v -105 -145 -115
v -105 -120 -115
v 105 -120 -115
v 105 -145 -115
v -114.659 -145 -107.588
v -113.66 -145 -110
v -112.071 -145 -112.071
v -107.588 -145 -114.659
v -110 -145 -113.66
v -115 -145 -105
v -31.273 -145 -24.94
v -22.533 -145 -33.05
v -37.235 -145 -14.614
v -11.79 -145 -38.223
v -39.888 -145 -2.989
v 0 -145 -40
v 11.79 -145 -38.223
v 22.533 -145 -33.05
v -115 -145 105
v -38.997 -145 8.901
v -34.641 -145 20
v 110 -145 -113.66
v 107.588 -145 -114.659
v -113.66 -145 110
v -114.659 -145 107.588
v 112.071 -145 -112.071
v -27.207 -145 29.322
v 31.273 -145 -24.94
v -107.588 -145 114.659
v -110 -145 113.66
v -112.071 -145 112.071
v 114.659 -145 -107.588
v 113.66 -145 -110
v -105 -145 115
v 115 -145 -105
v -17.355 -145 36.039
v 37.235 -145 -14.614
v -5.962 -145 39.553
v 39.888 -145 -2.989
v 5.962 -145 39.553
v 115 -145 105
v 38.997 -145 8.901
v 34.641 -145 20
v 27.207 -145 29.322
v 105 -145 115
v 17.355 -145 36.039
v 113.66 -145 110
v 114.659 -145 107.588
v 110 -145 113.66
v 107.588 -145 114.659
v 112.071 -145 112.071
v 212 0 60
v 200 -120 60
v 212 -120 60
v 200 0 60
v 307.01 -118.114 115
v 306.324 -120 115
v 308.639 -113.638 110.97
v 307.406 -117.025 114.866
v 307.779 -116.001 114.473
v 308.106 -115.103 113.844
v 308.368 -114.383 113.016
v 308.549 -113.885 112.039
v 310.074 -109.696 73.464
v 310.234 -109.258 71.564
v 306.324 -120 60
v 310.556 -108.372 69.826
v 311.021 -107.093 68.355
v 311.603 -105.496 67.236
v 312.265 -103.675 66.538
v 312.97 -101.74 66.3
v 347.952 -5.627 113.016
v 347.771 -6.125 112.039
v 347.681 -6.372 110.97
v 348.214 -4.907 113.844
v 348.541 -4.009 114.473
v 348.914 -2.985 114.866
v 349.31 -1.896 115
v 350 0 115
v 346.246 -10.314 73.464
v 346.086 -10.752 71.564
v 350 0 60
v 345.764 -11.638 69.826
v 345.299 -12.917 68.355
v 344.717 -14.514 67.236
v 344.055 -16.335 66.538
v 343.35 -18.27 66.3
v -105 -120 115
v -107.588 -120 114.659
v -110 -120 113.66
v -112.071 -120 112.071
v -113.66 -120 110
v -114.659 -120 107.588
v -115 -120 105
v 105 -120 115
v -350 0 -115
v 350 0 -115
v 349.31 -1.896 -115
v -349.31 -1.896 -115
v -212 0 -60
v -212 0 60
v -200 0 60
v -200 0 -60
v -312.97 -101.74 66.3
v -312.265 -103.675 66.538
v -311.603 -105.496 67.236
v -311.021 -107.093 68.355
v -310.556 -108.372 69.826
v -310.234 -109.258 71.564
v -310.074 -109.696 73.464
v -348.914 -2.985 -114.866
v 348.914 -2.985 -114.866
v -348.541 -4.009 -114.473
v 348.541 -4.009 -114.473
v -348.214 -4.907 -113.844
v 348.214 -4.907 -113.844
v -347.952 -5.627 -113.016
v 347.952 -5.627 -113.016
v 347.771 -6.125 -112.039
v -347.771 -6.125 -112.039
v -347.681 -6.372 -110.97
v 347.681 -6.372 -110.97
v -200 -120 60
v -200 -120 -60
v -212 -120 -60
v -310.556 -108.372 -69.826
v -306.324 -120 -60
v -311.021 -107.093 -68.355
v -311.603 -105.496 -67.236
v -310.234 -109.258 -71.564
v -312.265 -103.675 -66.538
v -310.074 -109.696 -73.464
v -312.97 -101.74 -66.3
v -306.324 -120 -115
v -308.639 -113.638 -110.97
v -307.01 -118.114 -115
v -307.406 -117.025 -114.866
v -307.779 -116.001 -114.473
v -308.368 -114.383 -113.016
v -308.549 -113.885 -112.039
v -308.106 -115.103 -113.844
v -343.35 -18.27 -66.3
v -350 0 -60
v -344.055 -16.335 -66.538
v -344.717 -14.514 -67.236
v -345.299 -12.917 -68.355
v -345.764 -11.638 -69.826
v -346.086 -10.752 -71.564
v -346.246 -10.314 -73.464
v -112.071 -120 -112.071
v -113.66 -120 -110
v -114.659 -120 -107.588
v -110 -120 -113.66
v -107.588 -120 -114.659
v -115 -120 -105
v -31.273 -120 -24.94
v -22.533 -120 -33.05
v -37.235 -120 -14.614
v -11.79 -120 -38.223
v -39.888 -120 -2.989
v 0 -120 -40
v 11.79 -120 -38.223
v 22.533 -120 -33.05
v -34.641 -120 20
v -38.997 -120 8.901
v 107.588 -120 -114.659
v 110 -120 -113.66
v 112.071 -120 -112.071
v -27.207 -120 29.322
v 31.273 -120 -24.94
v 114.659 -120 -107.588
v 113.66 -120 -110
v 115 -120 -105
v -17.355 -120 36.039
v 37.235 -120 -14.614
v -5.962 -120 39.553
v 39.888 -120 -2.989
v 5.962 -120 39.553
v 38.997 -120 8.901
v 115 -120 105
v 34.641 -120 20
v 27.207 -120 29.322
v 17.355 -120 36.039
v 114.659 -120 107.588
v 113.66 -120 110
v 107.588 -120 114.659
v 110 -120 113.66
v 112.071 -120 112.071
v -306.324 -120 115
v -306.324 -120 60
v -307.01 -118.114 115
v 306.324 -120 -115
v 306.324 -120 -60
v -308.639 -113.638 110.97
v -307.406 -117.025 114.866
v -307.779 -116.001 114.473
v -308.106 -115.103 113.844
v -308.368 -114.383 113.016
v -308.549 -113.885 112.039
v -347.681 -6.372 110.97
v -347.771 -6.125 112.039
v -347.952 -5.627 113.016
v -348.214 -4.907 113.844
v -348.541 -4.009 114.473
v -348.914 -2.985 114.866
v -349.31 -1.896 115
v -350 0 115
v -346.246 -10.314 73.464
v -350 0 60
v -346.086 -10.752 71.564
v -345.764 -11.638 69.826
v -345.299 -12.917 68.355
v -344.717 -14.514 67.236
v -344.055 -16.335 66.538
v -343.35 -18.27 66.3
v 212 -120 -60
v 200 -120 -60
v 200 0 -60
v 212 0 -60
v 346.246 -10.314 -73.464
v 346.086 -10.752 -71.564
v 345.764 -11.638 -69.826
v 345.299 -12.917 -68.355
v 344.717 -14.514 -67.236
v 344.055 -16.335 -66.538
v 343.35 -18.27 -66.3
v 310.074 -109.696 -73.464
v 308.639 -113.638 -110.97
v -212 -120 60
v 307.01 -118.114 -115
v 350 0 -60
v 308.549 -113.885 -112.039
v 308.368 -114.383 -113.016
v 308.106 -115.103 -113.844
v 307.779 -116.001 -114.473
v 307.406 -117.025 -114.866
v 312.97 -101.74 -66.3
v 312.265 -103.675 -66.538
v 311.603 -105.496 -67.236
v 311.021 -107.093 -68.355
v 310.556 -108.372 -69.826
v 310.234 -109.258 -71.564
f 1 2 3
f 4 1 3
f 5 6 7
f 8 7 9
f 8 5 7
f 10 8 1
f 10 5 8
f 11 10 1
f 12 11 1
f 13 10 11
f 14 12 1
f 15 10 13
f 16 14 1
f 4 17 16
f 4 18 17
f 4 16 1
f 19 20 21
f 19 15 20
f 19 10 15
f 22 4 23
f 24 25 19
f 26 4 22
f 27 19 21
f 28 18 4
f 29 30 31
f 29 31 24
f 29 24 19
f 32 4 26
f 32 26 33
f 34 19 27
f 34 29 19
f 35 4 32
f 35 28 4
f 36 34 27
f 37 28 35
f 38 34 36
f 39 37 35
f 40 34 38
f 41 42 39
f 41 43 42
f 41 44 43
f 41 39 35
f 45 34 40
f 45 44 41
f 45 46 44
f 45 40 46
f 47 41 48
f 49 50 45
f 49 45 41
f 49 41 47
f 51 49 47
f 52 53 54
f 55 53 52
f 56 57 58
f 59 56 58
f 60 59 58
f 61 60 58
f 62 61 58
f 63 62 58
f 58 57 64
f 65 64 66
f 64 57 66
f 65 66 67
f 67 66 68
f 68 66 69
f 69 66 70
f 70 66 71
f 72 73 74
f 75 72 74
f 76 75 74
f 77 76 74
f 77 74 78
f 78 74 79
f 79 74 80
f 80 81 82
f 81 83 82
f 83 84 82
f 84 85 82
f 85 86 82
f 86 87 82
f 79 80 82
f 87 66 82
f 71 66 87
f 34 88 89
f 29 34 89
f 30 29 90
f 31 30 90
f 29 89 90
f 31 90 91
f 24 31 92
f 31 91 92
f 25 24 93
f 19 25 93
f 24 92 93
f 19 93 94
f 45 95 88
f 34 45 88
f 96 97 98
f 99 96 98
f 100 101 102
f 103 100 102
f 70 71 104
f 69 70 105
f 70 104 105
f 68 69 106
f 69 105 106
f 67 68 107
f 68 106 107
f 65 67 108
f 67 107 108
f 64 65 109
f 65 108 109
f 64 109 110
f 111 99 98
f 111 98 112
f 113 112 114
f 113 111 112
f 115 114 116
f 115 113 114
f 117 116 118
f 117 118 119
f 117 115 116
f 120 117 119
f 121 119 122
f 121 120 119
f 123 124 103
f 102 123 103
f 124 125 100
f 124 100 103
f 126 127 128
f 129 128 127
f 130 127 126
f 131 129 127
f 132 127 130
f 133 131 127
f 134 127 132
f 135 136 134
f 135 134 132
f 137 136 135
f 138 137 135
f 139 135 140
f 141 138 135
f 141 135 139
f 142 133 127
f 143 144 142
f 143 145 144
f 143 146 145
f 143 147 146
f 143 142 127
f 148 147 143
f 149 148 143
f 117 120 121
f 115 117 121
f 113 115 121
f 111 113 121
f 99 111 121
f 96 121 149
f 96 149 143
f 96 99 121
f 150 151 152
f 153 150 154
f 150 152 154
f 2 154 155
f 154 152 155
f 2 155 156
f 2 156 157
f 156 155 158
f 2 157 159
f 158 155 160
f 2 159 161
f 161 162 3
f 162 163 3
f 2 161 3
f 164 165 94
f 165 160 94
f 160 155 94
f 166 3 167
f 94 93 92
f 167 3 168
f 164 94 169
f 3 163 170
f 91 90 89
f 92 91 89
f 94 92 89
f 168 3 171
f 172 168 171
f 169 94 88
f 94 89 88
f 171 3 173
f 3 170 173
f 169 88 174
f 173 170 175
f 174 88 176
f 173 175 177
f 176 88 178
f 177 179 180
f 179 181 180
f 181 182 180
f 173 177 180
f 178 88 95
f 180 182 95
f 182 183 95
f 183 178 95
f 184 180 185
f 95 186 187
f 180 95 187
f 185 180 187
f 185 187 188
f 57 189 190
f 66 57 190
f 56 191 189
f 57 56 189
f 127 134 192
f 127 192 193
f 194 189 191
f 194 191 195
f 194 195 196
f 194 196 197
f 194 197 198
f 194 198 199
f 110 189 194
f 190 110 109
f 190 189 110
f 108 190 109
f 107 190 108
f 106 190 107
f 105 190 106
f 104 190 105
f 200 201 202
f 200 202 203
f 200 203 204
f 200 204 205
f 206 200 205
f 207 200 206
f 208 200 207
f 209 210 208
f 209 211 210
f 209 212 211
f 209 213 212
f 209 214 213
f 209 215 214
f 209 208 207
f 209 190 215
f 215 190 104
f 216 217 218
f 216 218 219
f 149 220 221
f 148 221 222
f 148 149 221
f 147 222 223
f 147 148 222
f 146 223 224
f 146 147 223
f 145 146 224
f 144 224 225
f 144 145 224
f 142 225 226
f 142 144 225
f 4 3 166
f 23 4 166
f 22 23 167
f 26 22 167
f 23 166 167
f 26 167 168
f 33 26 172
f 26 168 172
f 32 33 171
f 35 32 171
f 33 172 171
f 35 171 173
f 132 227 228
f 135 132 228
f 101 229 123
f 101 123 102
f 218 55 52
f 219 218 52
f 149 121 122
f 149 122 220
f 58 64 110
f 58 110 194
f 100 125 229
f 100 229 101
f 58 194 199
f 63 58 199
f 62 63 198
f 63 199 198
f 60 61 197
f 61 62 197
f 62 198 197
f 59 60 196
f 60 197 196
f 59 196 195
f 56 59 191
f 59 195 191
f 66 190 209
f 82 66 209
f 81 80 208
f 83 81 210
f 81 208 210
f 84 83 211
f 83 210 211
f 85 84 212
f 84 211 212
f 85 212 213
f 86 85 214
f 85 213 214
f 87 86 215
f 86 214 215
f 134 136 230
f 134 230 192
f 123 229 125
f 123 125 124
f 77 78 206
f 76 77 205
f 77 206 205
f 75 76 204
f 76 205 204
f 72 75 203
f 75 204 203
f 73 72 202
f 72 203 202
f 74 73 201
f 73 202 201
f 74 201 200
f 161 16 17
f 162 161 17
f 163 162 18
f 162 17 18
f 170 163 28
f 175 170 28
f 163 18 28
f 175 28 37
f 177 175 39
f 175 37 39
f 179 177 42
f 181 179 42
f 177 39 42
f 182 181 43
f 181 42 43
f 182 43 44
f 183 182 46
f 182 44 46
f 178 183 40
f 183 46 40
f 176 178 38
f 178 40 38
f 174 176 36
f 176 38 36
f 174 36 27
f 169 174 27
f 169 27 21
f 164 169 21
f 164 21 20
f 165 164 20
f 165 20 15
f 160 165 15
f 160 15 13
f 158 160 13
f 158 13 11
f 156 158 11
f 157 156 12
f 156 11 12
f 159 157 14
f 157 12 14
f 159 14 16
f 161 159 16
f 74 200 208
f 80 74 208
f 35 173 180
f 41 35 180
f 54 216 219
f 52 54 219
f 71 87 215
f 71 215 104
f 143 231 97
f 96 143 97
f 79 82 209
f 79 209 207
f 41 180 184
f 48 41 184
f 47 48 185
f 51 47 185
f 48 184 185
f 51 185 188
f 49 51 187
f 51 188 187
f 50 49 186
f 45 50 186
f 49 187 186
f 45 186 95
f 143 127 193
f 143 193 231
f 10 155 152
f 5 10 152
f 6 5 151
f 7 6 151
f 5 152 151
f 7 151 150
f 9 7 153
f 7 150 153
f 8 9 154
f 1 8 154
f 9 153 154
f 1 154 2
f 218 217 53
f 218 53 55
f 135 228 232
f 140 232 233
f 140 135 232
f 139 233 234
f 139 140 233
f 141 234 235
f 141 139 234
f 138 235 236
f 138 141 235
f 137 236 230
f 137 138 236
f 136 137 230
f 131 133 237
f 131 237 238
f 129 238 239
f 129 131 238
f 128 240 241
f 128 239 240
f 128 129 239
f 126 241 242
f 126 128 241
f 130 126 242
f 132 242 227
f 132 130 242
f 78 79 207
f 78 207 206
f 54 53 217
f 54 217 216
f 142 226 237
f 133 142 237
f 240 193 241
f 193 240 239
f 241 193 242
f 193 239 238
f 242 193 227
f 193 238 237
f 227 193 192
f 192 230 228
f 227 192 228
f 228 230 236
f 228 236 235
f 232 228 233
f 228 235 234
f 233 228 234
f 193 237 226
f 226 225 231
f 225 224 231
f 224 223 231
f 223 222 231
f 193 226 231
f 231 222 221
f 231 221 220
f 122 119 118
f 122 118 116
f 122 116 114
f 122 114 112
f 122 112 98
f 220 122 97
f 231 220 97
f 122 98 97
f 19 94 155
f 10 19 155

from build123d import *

# Parameters (mm, degrees)
C_CHANNEL_120_X_12_1_DEPTH = 700
C_CHANNEL_120_X_12_2_DEPTH = 700
BOSS_EXTRUDE1_REACH        = 411.298
SKETCH13_W                 = 12
SKETCH13_H                 = 120
BOSS_EXTRUDE3_DEPTH        = 25
SKETCH16_R                 = 40
CUT_EXTRUDE2_DEPTH         = 25
CUT_EXTRUDE3_DEPTH         = 396.916657897
CUT_EXTRUDE3_DEPTH_BACK    = 396.916657897


with BuildPart() as part:
    # Sketch1 → C channel 120 X 12(1) (new body)
    with BuildSketch(Plane(origin=(-350, 0, 60), x_dir=(0, 0, 1), z_dir=(1, 0, 0))):
        with BuildLine():
            Line((55, 120), (0, 120))
            Line((0, 120), (0, 0))
            Line((0, 0), (55, 0))
            Line((55, 0), (55, 1.896373189))
            ThreePointArc((55, 1.896373189), (53.844151715, 4.907460917), (50.970378085, 6.371721718))
            Line((50.970378085, 6.371721718), (13.463772294, 10.313824837))
            ThreePointArc((13.463772294, 10.313824837), (8.354841396, 12.916955149), (6.3, 18.27))
            Line((6.3, 18.27), (6.3, 101.74))
            ThreePointArc((6.3, 101.74), (8.354841396, 107.093044851), (13.463772294, 109.696175163))
            Line((13.463772294, 109.696175163), (50.970378085, 113.638278282))
            ThreePointArc((50.970378085, 113.638278282), (53.844151715, 115.102539083), (55, 118.113626811))
            Line((55, 118.113626811), (55, 120))
        make_face()
    extrude(amount=C_CHANNEL_120_X_12_1_DEPTH)


with BuildPart() as body_2:
    # Sketch11 → C channel 120 X 12(2) (new body)
    with BuildSketch(Plane(origin=(-350, 0, -60), x_dir=(0, 0, -1), z_dir=(-1, 0, 0))):
        with BuildLine():
            Line((55, 120), (0, 120))
            Line((0, 120), (0, 0))
            Line((0, 0), (55, 0))
            Line((55, 0), (55, 1.896373189))
            ThreePointArc((55, 1.896373189), (53.844151715, 4.907460917), (50.970378085, 6.371721718))
            Line((50.970378085, 6.371721718), (13.463772294, 10.313824837))
            ThreePointArc((13.463772294, 10.313824837), (8.354841396, 12.916955149), (6.3, 18.27))
            Line((6.3, 18.27), (6.3, 101.74))
            ThreePointArc((6.3, 101.74), (8.354841396, 107.093044851), (13.463772294, 109.696175163))
            Line((13.463772294, 109.696175163), (50.970378085, 113.638278282))
            ThreePointArc((50.970378085, 113.638278282), (53.844151715, 115.102539083), (55, 118.113626811))
            Line((55, 118.113626811), (55, 120))
        make_face()
    extrude(amount=-C_CHANNEL_120_X_12_2_DEPTH)


with BuildPart() as body_3:

    # Sketch13 → Boss-Extrude1 (new, up to next)
    with BuildSketch(Plane.XY.offset(-60), mode=Mode.PRIVATE) as boss_extrude1_sk1:
        with Locations((-206, -60)):
            Rectangle(SKETCH13_W, SKETCH13_H)
    boss_extrude1_tool1 = extrude(boss_extrude1_sk1.sketch, amount=BOSS_EXTRUDE1_REACH, mode=Mode.PRIVATE) - part.part
    # Sketch13 → Boss-Extrude1 (new, up to next)
    with BuildSketch(Plane.XY.offset(-60), mode=Mode.PRIVATE) as boss_extrude1_sk2:
        with Locations((206, -60)):
            Rectangle(SKETCH13_W, SKETCH13_H)
    boss_extrude1_tool2 = extrude(boss_extrude1_sk2.sketch, amount=BOSS_EXTRUDE1_REACH, mode=Mode.PRIVATE) - part.part
    add(boss_extrude1_tool1.solids().sort_by_distance((-206, -60, -60))[0])
    add(boss_extrude1_tool2.solids().sort_by_distance((206, -60, -60))[0])


with BuildPart() as body_4:
    # Sketch15 → Boss-Extrude3 (new body)
    with BuildSketch(Plane.XZ.offset(120)):
        with BuildLine():
            Line((-105, -115), (105, -115))
            ThreePointArc((105, -115), (112.071067812, -112.071067812), (115, -105))
            Line((115, -105), (115, 105))
            ThreePointArc((115, 105), (112.071067812, 112.071067812), (105, 115))
            Line((105, 115), (-105, 115))
            ThreePointArc((-105, 115), (-112.071067812, 112.071067812), (-115, 105))
            Line((-115, 105), (-115, -105))
            ThreePointArc((-115, -105), (-112.071067812, -112.071067812), (-105, -115))
        make_face()
    extrude(amount=BOSS_EXTRUDE3_DEPTH)

    # Sketch16 → Cut-Extrude2 (cut)
    with BuildSketch(Plane.XZ.offset(145)):
        with Locations(Location((0, 0, 0), (0, 0, 270))):
            Circle(SKETCH16_R)
    extrude(amount=-CUT_EXTRUDE2_DEPTH, mode=Mode.SUBTRACT)


with BuildPart() as cut_extrude3_tool:
    # Sketch17 → Cut-Extrude3 (new, two sides: drawn at the far end of the back side and taken through both)
    with BuildSketch(Plane.XY.offset(-CUT_EXTRUDE3_DEPTH_BACK)):
        Polygon((-350, 0), (-350, -120), (-306.323571888, -120), align=None)
        Polygon((350, 0), (350, -120), (306.323571888, -120), align=None)
    extrude(amount=CUT_EXTRUDE3_DEPTH + CUT_EXTRUDE3_DEPTH_BACK)


with BuildPart() as part_1:
    add(part.part)

    # Cut-Extrude3: cut by cut_extrude3_tool
    add(cut_extrude3_tool.part, mode=Mode.SUBTRACT)


with BuildPart() as body_2_1:
    add(body_2.part)

    # Cut-Extrude3: cut by cut_extrude3_tool
    add(cut_extrude3_tool.part, mode=Mode.SUBTRACT)


solid = Compound([body_3.part, body_4.part, part_1.part, body_2_1.part])
